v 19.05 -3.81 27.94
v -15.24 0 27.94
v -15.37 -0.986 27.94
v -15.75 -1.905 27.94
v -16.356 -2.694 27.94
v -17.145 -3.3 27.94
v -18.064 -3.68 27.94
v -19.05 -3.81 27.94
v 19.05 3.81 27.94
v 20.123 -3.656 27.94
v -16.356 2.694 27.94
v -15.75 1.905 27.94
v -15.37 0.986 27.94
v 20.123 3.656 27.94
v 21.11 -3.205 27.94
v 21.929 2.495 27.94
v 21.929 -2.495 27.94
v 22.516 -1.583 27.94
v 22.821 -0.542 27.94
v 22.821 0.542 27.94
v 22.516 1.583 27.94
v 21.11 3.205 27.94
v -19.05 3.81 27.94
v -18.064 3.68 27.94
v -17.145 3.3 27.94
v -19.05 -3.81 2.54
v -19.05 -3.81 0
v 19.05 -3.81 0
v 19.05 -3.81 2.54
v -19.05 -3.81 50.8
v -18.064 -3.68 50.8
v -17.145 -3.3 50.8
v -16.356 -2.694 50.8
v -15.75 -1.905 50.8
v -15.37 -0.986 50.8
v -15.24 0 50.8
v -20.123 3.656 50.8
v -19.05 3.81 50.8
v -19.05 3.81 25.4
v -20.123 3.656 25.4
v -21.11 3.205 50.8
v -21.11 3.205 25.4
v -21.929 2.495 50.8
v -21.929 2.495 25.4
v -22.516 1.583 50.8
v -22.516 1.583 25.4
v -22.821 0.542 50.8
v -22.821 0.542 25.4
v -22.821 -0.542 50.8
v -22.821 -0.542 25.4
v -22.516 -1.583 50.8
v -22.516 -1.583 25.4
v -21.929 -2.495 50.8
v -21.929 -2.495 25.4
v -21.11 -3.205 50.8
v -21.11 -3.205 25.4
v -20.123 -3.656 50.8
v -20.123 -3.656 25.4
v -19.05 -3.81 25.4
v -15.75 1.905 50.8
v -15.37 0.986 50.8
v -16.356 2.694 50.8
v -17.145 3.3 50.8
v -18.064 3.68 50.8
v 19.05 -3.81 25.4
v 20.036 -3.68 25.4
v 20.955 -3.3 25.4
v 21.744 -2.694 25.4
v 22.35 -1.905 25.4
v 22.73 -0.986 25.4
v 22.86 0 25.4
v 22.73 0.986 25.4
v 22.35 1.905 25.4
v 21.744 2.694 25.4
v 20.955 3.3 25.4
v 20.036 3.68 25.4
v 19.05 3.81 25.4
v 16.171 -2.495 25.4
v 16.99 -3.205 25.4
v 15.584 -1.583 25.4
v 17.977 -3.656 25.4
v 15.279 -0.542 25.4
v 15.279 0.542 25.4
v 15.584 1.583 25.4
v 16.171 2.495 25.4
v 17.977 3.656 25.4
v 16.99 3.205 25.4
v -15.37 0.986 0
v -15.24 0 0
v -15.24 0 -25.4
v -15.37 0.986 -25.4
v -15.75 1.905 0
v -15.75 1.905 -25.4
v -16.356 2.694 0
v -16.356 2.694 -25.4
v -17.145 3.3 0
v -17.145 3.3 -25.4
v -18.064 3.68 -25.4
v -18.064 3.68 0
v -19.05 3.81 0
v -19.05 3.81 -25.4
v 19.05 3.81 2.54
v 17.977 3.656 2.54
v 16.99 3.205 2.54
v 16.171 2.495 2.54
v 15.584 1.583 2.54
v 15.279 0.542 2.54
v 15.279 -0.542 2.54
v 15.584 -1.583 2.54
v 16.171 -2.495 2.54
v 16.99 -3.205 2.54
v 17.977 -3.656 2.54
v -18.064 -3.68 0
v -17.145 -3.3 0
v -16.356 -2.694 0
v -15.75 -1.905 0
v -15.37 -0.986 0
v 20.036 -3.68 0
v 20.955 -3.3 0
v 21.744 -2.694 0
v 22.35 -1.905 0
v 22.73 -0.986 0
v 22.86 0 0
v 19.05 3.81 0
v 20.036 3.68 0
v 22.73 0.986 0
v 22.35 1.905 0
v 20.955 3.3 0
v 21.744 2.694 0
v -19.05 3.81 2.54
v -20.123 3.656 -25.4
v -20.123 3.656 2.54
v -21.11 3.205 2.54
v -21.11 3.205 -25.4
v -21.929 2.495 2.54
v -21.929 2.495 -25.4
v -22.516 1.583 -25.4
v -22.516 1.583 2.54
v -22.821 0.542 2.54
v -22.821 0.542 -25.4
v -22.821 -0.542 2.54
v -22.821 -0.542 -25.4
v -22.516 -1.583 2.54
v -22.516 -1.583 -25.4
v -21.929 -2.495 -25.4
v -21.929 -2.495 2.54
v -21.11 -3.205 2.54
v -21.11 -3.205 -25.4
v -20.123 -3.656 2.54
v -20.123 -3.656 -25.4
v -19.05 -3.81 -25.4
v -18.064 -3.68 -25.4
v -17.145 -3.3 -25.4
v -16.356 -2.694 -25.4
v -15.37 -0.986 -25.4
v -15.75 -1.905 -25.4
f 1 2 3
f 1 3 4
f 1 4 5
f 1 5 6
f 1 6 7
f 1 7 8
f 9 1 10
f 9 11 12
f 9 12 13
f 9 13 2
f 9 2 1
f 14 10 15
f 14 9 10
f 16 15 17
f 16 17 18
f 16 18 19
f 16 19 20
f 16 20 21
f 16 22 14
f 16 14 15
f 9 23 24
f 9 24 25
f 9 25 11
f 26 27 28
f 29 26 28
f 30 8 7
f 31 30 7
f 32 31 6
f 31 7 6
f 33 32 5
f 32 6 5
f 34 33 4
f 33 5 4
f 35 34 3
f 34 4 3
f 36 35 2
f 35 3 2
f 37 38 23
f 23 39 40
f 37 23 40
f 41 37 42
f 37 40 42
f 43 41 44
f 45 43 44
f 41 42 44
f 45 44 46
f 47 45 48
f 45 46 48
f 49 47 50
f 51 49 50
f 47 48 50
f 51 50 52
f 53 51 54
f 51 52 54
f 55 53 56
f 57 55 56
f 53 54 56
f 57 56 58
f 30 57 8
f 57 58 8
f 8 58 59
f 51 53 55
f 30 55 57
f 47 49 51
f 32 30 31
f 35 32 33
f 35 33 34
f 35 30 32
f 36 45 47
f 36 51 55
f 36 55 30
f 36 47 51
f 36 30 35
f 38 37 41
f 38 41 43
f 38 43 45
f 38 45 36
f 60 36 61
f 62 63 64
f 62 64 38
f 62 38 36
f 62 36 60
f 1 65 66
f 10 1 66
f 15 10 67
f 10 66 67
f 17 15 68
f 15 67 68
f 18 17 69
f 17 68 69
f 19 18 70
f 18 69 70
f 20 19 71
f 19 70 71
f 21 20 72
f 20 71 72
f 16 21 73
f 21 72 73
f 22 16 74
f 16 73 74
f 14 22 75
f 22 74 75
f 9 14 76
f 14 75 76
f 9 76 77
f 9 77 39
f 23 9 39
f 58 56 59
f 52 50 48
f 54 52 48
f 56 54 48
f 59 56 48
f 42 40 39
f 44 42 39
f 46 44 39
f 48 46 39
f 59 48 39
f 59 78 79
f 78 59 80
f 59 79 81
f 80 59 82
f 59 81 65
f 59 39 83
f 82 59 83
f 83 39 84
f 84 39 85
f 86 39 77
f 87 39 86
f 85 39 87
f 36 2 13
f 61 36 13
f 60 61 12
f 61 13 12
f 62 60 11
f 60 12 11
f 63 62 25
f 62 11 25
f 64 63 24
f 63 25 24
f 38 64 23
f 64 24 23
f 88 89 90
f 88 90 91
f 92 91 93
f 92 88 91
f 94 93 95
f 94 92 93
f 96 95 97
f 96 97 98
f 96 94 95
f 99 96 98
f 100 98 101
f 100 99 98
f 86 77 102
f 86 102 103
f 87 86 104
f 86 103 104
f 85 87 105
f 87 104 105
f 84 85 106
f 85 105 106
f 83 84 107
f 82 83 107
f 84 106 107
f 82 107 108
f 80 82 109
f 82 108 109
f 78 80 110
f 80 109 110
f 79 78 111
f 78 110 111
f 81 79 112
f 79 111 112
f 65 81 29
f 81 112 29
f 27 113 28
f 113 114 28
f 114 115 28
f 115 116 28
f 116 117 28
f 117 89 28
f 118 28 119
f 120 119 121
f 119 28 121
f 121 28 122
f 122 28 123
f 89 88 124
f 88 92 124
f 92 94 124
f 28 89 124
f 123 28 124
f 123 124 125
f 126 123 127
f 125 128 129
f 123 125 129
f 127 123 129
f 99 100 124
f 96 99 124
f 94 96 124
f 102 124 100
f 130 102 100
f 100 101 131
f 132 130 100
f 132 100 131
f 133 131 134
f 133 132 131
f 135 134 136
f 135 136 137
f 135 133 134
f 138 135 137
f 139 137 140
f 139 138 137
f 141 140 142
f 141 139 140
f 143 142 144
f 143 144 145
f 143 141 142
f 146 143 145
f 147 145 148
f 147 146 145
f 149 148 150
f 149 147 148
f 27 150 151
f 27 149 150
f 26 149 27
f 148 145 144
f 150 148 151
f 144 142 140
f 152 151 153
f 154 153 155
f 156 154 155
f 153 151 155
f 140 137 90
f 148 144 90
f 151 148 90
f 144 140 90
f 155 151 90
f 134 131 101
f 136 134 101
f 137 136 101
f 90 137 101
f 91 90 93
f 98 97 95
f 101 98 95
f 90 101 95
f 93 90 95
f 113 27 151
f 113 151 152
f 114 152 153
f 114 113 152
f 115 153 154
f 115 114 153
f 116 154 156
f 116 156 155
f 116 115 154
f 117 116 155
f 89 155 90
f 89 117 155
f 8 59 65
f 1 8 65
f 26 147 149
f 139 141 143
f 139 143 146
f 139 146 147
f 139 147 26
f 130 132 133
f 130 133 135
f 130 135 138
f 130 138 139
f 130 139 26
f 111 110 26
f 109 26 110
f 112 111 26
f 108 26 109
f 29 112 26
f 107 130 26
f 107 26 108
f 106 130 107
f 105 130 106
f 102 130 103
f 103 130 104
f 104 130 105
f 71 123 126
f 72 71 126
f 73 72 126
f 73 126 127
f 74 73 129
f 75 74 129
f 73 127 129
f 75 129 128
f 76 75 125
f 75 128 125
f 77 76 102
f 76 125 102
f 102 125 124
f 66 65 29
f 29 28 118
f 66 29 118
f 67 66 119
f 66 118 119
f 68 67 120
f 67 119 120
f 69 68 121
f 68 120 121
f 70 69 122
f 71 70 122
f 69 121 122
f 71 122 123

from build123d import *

# Parameters (mm, degrees)
F1_DEPTH  = 2.54
F2_DEPTH  = 25.4
F3_DEPTH  = 12.7
F4_DEPTH  = 2.54
F6_DEPTH  = 2.54
F7_DEPTH  = 25.4
F9_DEPTH  = 2.54
F10_DEPTH = 25.4


with BuildPart() as f1:
    # F0 (on Top) → F1 (new body)
    with BuildSketch(Plane.XY):
        with BuildLine():
            Line((-19.05, -3.81), (19.05, -3.81))
            ThreePointArc((19.05, -3.81), (15.24, 0), (19.05, 3.81))
            Line((19.05, 3.81), (-19.05, 3.81))
            ThreePointArc((-19.05, 3.81), (-16.355923, 2.694077), (-15.24, 0))
            ThreePointArc((-15.24, 0), (-16.355923, -2.694077), (-19.05, -3.81))
        make_face()
    extrude(amount=F1_DEPTH)

    # F0 (on Top) → F2 (join)
    with BuildSketch(Plane.XY):
        with BuildLine():
            ThreePointArc((19.05, 3.81), (15.24, 0), (19.05, -3.81))
            ThreePointArc((19.05, -3.81), (21.744077, -2.694077), (22.86, 0))
            ThreePointArc((22.86, 0), (21.744077, 2.694077), (19.05, 3.81))
        make_face()
    extrude(amount=F2_DEPTH)

    # F5 (on face) → F6 (join)
    with BuildSketch(Plane.XY.offset(25.4)):
        with BuildLine():
            Line((-19.05, -3.81), (19.05, -3.81))
            ThreePointArc((19.05, -3.81), (22.86, 0), (19.05, 3.81))
            Line((19.05, 3.81), (-19.05, 3.81))
            ThreePointArc((-19.05, 3.81), (-16.355923, 2.694077), (-15.24, 0))
            ThreePointArc((-15.24, 0), (-16.355923, -2.694077), (-19.05, -3.81))
        make_face()
    extrude(amount=F6_DEPTH)

    # F5 (on face) → F7 (join)
    with BuildSketch(Plane.XY.offset(25.4)):
        with BuildLine():
            ThreePointArc((-19.05, 3.81), (-22.86, 0), (-19.05, -3.81))
            ThreePointArc((-19.05, -3.81), (-16.355923, -2.694077), (-15.24, 0))
            ThreePointArc((-15.24, 0), (-16.355923, 2.694077), (-19.05, 3.81))
        make_face()
    extrude(amount=F7_DEPTH)

    # F0 (on Top) → F9 (join)
    with BuildSketch(Plane.XY):
        with BuildLine():
            ThreePointArc((-19.05, 3.81), (-22.86, 0), (-19.05, -3.81))
            ThreePointArc((-19.05, -3.81), (-16.355923, -2.694077), (-15.24, 0))
            ThreePointArc((-15.24, 0), (-16.355923, 2.694077), (-19.05, 3.81))
        make_face()
    extrude(amount=F9_DEPTH)

    # F0 (on Top) → F10 (join)
    with BuildSketch(Plane.XY):
        with BuildLine():
            ThreePointArc((-19.05, 3.81), (-22.86, 0), (-19.05, -3.81))
            ThreePointArc((-19.05, -3.81), (-16.355923, -2.694077), (-15.24, 0))
            ThreePointArc((-15.24, 0), (-16.355923, 2.694077), (-19.05, 3.81))
        make_face()
    extrude(amount=-F10_DEPTH)


with BuildPart() as f3:
    # F0 (on Top) → F3 (new body)
    with BuildSketch(Plane.XY):
        with BuildLine():
            ThreePointArc((-19.05, 3.81), (-22.86, 0), (-19.05, -3.81))
            ThreePointArc((-19.05, -3.81), (-16.355923, -2.694077), (-15.24, 0))
            ThreePointArc((-15.24, 0), (-16.355923, 2.694077), (-19.05, 3.81))
        make_face()
    extrude(amount=-F3_DEPTH)


with BuildPart() as f4:
    # F0 (on Top) → F4 (new body)
    with BuildSketch(Plane.XY):
        with BuildLine():
            ThreePointArc((-19.05, 3.81), (-22.86, 0), (-19.05, -3.81))
            ThreePointArc((-19.05, -3.81), (-16.355923, -2.694077), (-15.24, 0))
            ThreePointArc((-15.24, 0), (-16.355923, 2.694077), (-19.05, 3.81))
        make_face()
    extrude(amount=F4_DEPTH)


solid = f1.part
